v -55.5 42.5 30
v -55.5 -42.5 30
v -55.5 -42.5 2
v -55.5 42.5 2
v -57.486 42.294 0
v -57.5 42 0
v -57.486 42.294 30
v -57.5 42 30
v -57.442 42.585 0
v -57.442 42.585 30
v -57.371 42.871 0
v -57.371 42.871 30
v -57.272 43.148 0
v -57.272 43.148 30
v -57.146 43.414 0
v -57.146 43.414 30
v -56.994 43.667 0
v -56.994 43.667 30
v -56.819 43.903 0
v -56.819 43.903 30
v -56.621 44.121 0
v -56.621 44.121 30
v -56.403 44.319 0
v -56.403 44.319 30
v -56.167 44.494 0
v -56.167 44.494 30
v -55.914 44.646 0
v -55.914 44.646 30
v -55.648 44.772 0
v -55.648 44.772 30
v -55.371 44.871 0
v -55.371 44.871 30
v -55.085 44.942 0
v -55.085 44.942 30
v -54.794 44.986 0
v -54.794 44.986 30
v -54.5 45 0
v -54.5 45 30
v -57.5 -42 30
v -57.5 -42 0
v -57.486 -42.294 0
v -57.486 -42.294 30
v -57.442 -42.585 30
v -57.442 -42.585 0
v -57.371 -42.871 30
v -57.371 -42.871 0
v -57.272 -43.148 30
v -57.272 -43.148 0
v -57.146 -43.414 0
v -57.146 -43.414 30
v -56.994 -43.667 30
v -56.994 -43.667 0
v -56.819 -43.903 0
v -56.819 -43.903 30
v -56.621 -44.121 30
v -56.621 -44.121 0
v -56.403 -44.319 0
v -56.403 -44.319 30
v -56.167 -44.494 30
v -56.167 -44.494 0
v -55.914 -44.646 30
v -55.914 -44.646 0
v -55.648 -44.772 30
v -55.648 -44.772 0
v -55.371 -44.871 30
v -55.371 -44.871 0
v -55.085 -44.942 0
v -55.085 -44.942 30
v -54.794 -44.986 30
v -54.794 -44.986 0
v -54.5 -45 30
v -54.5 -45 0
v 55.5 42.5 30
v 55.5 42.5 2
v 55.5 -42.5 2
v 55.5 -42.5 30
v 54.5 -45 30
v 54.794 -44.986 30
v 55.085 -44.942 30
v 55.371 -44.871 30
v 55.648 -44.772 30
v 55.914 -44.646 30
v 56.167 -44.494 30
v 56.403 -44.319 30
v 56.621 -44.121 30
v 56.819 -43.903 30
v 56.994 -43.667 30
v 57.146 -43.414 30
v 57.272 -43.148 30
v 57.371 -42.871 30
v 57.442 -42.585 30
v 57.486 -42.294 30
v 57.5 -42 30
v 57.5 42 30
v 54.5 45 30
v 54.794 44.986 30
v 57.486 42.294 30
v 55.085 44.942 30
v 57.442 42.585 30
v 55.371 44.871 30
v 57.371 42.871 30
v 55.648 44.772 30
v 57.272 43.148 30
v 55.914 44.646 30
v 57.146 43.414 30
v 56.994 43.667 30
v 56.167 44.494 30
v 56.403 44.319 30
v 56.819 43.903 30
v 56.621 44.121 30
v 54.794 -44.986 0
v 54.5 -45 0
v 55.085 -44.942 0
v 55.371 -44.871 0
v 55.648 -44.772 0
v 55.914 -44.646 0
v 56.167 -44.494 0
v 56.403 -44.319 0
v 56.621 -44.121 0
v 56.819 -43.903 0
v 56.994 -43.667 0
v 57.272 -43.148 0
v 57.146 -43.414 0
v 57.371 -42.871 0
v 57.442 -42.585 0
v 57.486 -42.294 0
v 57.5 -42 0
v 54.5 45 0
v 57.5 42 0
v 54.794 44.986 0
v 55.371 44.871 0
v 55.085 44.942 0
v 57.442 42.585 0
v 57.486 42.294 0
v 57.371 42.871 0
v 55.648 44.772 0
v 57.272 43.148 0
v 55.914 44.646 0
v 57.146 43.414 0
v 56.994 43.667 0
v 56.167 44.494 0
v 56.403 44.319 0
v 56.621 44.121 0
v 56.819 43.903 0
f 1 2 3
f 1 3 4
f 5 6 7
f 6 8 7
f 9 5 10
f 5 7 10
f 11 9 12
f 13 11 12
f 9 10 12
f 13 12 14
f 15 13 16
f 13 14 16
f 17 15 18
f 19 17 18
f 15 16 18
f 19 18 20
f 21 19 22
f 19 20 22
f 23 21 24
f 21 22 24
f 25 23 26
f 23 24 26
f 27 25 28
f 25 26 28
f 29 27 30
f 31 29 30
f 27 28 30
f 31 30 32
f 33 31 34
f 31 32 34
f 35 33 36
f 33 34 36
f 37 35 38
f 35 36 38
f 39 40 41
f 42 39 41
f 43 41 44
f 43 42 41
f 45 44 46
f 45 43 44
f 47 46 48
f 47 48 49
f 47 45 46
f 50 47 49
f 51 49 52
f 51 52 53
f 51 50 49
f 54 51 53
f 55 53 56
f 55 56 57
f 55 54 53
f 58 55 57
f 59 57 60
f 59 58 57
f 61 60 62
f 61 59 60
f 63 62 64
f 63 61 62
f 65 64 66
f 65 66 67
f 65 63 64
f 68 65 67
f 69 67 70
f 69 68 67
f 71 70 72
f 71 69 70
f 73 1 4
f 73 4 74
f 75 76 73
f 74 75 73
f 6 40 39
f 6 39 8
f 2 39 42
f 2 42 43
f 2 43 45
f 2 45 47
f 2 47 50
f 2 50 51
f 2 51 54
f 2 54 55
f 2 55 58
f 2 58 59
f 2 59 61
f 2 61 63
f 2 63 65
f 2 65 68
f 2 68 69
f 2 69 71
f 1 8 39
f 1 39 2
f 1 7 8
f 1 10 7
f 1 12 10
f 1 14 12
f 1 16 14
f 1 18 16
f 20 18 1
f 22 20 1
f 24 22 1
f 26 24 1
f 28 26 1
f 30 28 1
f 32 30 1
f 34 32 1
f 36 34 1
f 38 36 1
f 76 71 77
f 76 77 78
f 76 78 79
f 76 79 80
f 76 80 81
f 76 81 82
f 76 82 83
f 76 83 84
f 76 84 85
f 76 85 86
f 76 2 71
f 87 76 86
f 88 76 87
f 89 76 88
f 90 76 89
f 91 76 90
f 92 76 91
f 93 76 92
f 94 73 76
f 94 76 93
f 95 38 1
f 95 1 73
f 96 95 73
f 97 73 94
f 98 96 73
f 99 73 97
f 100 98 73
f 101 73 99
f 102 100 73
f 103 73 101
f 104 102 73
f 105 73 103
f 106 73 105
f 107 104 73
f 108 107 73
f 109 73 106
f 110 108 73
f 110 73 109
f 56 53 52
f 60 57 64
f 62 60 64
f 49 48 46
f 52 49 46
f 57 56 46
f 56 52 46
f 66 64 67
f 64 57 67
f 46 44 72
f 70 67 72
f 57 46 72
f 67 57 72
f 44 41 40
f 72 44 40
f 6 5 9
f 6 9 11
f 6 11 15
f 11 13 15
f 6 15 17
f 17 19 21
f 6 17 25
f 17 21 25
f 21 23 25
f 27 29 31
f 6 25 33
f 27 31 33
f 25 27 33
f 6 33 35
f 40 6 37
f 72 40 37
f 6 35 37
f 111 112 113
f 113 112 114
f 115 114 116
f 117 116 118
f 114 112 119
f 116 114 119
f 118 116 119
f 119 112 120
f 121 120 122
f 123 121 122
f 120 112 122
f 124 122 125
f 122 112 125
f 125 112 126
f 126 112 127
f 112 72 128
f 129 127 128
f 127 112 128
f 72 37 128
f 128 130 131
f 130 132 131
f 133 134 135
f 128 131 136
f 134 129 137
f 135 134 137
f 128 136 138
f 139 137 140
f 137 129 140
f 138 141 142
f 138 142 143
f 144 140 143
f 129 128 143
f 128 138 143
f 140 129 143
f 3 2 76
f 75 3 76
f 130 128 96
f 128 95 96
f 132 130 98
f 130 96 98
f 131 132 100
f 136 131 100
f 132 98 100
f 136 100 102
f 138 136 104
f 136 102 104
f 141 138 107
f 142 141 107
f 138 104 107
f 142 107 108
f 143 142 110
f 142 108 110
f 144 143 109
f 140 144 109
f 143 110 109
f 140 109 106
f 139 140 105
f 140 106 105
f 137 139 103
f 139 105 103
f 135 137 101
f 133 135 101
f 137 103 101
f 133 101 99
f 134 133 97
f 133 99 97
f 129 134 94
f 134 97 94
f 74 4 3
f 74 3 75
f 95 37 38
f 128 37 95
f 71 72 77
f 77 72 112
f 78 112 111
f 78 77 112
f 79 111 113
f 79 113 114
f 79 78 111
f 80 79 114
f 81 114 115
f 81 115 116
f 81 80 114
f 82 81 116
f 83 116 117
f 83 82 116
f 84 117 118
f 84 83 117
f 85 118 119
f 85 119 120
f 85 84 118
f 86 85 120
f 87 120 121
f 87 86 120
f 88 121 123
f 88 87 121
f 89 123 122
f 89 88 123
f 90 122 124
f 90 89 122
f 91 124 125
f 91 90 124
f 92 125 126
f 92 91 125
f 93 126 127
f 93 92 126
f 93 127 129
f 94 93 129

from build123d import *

# Parameters (mm, degrees)
F0_W     = 115
F0_H     = 90
F1_DEPTH = 30
F3_W     = 111
F3_H     = 85
F4_DEPTH = 28
F5_R     = 3


# Not quite as in the source:
# - a feature names something its author has since deleted; it is built from what else it names


with BuildPart() as f1:
    # F0 (on Top) → F1 (new body)
    with BuildSketch(Plane.XY):
        Rectangle(F0_W, F0_H)
    extrude(amount=F1_DEPTH)

    # F3 (on offset) → F4 (cut)
    with BuildSketch(Plane.XY.offset(30)):
        Rectangle(F3_W, F3_H)
    extrude(amount=-F4_DEPTH, mode=Mode.SUBTRACT)

    # F5
    f5_edges = [f1.edges().sort_by_distance(p)[0] for p in [
        (-57.5, 45, 15),
        (57.5, 45, 15),
        (57.5, -45, 15),
        (-57.5, -45, 15),
    ]]
    fillet(f5_edges, radius=F5_R)


solid = f1.part
